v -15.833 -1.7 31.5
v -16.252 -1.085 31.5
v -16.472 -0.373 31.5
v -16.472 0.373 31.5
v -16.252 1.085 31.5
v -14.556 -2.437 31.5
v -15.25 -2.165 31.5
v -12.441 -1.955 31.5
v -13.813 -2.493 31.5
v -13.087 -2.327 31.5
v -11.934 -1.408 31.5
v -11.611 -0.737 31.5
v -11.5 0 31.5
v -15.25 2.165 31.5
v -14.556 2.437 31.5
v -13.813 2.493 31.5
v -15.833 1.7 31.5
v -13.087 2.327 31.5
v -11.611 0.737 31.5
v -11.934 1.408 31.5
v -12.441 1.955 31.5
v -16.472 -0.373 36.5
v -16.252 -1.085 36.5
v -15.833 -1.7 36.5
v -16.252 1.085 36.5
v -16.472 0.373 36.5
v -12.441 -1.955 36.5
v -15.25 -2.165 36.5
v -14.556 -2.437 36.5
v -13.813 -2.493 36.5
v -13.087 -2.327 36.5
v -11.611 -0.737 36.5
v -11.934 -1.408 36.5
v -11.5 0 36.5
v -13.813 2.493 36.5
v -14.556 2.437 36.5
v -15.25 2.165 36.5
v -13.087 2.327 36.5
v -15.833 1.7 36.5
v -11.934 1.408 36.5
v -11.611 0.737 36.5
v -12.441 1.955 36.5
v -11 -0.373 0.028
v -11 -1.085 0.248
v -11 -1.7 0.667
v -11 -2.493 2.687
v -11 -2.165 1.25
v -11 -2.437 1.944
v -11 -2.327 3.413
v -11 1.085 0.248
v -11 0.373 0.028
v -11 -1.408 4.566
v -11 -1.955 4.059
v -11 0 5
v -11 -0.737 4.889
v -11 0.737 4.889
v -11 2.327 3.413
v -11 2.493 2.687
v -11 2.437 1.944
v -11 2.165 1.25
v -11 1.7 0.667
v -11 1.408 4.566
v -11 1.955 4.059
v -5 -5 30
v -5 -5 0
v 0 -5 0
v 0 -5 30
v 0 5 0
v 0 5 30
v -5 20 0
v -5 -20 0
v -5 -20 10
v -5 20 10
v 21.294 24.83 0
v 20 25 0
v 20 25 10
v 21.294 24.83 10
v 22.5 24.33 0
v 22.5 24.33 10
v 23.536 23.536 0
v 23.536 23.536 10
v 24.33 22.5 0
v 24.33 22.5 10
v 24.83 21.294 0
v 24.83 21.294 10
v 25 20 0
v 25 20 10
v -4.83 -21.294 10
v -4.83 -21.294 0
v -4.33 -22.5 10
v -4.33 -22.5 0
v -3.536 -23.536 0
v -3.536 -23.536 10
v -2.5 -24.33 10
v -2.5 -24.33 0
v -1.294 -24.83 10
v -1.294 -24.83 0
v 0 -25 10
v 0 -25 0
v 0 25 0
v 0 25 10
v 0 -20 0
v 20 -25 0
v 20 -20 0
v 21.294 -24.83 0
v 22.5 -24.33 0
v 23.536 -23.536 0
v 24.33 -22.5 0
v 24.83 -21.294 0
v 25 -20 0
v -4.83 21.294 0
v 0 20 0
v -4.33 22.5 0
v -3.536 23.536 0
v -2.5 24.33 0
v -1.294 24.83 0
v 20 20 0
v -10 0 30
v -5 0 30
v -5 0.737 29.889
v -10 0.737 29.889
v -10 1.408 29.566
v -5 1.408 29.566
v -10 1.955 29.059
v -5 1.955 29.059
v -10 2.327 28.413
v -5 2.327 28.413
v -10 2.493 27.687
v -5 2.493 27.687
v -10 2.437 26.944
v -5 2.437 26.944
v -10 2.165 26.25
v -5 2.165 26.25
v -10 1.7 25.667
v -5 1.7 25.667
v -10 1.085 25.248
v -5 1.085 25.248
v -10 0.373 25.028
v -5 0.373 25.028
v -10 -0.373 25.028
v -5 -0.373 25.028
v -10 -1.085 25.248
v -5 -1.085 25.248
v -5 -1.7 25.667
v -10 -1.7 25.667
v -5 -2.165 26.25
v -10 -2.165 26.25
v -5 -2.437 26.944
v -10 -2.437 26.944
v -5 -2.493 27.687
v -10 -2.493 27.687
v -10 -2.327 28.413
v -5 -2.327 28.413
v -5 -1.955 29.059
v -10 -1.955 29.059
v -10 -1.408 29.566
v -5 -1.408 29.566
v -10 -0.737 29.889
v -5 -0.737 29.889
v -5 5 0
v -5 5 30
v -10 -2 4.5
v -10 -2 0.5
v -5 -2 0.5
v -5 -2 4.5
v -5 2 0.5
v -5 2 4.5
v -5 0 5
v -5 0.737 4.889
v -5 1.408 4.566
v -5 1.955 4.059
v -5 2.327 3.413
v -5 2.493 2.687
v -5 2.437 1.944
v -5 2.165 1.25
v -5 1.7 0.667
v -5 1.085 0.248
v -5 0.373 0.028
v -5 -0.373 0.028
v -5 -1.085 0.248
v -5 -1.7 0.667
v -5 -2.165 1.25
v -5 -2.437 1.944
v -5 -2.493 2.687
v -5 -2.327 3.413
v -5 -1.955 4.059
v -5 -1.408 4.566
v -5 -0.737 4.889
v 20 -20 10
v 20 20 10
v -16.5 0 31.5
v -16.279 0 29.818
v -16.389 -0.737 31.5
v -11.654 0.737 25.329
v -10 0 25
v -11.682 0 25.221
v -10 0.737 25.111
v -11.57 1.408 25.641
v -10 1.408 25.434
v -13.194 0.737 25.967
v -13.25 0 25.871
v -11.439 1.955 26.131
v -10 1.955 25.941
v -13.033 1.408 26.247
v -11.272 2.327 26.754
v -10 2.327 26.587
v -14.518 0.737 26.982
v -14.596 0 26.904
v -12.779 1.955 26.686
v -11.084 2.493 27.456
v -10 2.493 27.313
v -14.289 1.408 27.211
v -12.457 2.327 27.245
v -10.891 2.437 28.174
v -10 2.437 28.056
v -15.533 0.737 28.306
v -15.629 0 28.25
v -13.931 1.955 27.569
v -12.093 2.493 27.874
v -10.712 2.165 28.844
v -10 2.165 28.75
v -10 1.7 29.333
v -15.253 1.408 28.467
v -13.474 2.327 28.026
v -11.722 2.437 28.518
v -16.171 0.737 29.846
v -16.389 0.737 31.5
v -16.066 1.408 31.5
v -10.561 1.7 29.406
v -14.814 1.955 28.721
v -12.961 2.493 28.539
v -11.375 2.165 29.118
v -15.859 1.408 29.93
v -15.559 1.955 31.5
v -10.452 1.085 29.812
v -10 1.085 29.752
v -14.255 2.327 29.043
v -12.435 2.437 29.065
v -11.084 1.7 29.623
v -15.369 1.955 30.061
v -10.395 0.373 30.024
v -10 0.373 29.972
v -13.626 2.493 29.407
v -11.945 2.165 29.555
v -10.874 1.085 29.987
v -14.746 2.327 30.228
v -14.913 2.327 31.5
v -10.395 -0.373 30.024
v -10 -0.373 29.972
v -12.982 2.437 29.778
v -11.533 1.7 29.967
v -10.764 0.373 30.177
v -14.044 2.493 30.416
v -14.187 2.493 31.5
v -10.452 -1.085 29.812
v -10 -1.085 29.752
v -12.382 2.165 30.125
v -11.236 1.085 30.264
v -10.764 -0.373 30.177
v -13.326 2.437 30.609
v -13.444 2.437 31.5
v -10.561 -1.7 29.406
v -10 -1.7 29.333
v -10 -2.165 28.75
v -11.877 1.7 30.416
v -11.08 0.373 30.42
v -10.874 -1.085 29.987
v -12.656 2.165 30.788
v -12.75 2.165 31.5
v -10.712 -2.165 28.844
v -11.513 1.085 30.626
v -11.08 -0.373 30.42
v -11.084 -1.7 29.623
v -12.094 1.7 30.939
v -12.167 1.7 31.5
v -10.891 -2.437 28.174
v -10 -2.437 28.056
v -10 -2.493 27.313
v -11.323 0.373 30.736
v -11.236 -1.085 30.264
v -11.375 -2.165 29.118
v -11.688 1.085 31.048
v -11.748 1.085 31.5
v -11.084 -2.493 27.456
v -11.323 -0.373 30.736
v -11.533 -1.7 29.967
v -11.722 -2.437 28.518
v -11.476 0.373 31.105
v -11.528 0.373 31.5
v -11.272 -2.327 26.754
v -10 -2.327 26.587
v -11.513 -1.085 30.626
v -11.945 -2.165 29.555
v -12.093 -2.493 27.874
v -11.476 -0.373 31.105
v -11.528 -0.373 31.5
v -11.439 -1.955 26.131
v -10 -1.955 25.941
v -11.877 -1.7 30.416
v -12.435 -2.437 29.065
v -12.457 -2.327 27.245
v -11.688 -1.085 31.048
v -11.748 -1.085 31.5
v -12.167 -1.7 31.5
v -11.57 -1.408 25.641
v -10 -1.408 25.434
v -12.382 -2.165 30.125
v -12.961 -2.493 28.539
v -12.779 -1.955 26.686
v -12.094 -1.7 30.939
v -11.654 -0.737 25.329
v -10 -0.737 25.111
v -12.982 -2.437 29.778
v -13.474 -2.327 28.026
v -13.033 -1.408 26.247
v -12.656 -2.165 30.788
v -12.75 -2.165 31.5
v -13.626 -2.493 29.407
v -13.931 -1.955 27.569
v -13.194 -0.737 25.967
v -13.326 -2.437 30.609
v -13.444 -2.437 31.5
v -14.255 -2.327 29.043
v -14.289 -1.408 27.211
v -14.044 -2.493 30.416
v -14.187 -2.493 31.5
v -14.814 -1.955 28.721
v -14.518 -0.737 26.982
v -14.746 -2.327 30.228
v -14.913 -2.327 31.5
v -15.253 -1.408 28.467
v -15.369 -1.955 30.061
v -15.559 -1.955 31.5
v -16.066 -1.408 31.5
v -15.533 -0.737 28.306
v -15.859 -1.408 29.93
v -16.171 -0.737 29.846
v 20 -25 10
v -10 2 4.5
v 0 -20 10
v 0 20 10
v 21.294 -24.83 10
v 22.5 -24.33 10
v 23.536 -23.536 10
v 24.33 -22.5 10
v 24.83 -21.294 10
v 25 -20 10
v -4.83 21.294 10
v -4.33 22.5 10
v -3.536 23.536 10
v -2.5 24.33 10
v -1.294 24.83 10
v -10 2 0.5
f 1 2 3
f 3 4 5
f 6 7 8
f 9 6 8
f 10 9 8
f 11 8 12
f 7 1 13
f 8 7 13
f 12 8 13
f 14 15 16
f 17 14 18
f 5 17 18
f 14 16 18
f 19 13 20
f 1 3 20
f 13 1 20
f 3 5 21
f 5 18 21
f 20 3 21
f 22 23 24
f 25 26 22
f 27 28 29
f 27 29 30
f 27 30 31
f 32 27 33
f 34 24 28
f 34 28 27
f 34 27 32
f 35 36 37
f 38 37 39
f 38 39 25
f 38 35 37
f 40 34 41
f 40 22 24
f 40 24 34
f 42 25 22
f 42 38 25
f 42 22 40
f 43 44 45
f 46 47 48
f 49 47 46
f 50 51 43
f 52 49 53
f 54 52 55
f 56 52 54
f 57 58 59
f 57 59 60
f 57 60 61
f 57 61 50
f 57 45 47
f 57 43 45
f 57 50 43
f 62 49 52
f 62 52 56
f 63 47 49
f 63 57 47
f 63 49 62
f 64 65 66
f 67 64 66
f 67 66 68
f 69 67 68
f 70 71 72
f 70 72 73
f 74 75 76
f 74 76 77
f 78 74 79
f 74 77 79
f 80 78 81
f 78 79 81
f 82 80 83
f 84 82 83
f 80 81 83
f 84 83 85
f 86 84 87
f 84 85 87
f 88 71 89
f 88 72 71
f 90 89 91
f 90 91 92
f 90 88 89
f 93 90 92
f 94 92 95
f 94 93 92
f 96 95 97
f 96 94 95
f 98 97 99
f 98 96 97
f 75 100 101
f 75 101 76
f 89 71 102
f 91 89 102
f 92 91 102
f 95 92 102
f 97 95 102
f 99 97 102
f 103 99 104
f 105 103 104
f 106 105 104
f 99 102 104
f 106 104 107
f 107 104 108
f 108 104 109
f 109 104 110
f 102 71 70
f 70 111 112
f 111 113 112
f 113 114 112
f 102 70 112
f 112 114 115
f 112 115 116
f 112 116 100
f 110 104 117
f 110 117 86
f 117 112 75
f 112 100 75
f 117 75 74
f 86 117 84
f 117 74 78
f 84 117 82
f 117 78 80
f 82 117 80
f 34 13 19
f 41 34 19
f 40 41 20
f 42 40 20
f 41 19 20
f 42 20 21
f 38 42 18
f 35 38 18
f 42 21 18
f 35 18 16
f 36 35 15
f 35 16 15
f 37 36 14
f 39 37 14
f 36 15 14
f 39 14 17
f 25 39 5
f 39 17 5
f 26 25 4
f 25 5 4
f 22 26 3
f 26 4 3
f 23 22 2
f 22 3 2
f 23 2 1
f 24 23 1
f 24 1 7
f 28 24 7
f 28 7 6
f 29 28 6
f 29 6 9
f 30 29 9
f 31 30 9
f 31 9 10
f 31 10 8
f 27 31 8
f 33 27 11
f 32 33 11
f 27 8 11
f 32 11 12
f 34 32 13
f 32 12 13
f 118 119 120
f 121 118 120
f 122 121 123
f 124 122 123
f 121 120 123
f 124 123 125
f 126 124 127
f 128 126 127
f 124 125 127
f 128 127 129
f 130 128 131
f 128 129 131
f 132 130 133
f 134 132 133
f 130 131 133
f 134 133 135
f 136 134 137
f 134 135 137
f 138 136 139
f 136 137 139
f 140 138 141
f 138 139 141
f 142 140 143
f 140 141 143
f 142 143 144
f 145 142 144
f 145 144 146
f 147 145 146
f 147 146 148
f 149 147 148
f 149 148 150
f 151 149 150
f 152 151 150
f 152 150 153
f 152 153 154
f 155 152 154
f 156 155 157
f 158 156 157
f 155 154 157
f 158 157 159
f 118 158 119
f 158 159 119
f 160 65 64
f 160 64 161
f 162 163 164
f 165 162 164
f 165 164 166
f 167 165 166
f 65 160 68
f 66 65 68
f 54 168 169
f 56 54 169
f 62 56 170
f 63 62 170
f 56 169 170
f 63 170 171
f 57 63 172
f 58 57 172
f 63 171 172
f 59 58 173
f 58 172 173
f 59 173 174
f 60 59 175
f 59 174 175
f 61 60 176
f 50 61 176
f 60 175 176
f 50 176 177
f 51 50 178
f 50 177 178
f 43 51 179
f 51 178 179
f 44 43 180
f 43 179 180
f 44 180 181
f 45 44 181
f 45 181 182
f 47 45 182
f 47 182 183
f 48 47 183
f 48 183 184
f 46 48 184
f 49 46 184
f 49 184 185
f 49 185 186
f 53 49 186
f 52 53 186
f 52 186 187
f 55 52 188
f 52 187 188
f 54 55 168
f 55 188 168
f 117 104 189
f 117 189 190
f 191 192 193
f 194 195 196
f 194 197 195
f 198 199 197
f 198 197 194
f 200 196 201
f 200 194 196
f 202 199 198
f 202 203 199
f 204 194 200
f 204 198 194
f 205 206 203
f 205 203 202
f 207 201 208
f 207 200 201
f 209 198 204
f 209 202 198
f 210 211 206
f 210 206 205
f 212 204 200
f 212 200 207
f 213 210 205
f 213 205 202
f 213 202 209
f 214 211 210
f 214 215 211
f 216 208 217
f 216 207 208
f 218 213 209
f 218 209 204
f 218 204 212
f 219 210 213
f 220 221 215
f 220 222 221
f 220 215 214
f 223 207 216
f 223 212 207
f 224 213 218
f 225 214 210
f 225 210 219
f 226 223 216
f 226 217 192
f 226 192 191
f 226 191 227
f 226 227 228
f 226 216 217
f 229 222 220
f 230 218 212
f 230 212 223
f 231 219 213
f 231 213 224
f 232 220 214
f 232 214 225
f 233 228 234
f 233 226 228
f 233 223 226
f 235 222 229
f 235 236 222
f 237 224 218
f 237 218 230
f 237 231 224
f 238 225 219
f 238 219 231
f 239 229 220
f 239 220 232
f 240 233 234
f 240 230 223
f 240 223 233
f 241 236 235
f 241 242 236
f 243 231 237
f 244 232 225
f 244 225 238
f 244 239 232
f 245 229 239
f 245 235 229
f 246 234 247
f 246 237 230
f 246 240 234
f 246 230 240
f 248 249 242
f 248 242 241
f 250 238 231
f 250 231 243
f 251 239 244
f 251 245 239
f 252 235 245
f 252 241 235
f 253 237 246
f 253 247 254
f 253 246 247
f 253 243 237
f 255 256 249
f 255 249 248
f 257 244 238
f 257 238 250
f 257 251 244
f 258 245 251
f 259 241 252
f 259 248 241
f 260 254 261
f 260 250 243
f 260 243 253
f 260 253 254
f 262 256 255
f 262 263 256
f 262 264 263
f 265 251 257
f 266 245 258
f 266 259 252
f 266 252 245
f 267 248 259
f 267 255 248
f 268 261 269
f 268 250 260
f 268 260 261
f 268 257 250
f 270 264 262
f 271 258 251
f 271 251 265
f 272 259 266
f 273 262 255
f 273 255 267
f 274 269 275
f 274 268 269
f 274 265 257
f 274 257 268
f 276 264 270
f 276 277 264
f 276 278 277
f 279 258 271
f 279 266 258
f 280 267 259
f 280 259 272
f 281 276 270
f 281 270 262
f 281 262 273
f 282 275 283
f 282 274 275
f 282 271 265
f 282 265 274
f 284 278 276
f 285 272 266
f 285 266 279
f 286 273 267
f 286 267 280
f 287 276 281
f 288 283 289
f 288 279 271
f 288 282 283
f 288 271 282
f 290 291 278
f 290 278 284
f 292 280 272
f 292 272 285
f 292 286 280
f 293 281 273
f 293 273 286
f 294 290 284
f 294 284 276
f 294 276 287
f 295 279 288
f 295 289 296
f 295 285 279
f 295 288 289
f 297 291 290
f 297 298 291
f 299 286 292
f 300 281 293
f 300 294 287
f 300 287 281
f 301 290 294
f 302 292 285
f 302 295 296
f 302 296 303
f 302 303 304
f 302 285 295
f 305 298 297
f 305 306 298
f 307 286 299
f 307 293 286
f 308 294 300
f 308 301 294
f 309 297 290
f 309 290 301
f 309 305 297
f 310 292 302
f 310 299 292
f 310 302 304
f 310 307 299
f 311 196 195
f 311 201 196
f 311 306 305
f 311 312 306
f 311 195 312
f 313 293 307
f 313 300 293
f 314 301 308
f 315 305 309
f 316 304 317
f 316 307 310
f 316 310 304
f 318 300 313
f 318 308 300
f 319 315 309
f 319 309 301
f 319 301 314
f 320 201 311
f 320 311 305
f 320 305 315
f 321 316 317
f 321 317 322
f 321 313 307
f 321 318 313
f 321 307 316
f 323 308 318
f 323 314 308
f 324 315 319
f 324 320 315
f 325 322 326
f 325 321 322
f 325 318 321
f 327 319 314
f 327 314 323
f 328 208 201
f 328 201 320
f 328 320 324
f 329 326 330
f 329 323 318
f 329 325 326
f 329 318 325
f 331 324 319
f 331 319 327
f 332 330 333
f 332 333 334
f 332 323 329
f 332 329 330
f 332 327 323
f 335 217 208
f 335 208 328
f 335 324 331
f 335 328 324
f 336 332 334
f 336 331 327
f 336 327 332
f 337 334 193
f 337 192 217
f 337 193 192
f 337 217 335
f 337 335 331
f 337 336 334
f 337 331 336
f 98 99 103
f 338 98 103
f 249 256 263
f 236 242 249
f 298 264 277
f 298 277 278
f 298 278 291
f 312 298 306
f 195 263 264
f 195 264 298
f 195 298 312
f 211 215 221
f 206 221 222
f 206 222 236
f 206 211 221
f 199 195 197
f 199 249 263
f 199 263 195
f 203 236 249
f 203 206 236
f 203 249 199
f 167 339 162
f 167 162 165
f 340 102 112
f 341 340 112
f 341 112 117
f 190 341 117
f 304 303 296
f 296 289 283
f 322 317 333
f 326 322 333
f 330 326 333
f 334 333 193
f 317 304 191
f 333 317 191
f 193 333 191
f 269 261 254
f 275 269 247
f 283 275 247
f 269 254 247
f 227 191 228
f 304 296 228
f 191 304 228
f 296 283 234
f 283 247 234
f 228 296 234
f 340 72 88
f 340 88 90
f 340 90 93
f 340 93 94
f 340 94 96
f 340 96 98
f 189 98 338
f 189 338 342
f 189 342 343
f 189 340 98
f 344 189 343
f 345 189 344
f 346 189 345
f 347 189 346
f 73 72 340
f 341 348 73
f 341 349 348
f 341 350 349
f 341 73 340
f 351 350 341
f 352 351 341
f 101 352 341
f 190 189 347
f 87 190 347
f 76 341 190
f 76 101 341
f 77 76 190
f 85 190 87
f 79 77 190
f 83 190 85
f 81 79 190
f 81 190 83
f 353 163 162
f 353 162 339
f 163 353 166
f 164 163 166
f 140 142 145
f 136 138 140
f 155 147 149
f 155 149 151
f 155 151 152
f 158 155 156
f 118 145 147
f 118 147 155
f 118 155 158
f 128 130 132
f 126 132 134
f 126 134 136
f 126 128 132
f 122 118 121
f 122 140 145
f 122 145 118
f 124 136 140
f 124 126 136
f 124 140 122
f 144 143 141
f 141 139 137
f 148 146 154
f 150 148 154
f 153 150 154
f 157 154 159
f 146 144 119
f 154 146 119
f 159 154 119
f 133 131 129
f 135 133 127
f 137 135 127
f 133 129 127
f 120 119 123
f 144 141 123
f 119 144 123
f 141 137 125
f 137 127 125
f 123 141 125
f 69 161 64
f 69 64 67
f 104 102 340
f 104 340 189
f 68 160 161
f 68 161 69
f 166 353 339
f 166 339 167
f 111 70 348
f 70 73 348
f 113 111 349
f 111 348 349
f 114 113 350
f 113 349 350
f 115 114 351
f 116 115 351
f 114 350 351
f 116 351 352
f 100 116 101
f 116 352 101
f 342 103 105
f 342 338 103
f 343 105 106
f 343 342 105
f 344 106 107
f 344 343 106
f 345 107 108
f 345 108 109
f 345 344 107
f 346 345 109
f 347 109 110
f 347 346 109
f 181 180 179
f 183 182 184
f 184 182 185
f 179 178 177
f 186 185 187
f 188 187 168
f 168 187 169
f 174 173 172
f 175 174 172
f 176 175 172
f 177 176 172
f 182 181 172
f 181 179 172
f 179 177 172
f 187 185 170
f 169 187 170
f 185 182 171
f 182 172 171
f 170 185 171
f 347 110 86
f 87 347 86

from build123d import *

# Parameters (mm, degrees)
CYLINDER002_R           = 2.5
CYLINDER002_DEPTH       = 6
CYLINDER002_PITCH_ANGLE = -90
BOX001_W                = 5
BOX001_H                = 10
BOX001_DEPTH            = 30
CYLINDER003_R           = 2.5
CYLINDER003_DEPTH       = 5
CYLINDER003_PITCH_ANGLE = -90
TORUS_R                 = 2.5
TORUS_ANGLE             = 90
CYLINDER004_R           = 2.5
CYLINDER004_DEPTH       = 5
BOX002_W                = 5
BOX002_H                = 4
BOX002_DEPTH            = 4
BOX003_W                = 20
BOX003_H                = 40
BOX003_DEPTH            = 10
BOX_W                   = 30
BOX_H                   = 50
BOX_DEPTH               = 10
FILLET_R                = 5


with BuildPart() as cylinder002:
    # Cylinder002 → Cylinder002 (new body)
    with BuildSketch(Plane.XY):
        Circle(CYLINDER002_R)
    extrude(amount=CYLINDER002_DEPTH)


with BuildPart() as cylinder002_1:
    # Cylinder002 pitch: moved
    add(cylinder002.part.rotate(Axis((0, 0, 0), (0, 1, 0)), CYLINDER002_PITCH_ANGLE))


with BuildPart() as cylinder002_2:
    # Cylinder002 placement: moved
    add(cylinder002_1.part.moved(Location((-5, 0, 2.5))))


with BuildPart() as cube001:
    # Box001 → Box001 (new body)
    with BuildSketch(Plane(origin=(-5, -5, 0), x_dir=(1, 0, 0), z_dir=(0, 0, 1))):
        with Locations((2.5, 5)):
            Rectangle(BOX001_W, BOX001_H)
    extrude(amount=BOX001_DEPTH)


with BuildPart() as cylinder003:
    # Cylinder003 → Cylinder003 (new body)
    with BuildSketch(Plane.XY):
        Circle(CYLINDER003_R)
    extrude(amount=CYLINDER003_DEPTH)


with BuildPart() as cylinder003_1:
    # Cylinder003 pitch: moved
    add(cylinder003.part.rotate(Axis((0, 0, 0), (0, 1, 0)), CYLINDER003_PITCH_ANGLE))


with BuildPart() as cylinder003_2:
    # Cylinder003 placement: moved
    add(cylinder003_1.part.moved(Location((-5, 0, 27.5))))


with BuildPart() as torus:
    # Torus → Torus (revolve)
    with BuildSketch(Plane(origin=(-10, 0, 31.5), x_dir=(0, 0, -1), z_dir=(1, 0, 0))):
        with Locations((4, 0)):
            Circle(TORUS_R)
    revolve(axis=Axis((-10, 0, 31.5), (0, 1, 0)), revolution_arc=TORUS_ANGLE)


with BuildPart() as cylinder004:
    # Cylinder004 → Cylinder004 (new body)
    with BuildSketch(Plane(origin=(-14, 0, 31.5), x_dir=(1, 0, 0), z_dir=(0, 0, 1))):
        Circle(CYLINDER004_R)
    extrude(amount=CYLINDER004_DEPTH)


with BuildPart() as cube002:
    # Box002 → Box002 (new body)
    with BuildSketch(Plane(origin=(-10, -2, 0.5), x_dir=(1, 0, 0), z_dir=(0, 0, 1))):
        with Locations((2.5, 2)):
            Rectangle(BOX002_W, BOX002_H)
    extrude(amount=BOX002_DEPTH)


with BuildPart() as cube003:
    # Box003 → Box003 (new body)
    with BuildSketch(Plane(origin=(0, -20, 0), x_dir=(1, 0, 0), z_dir=(0, 0, 1))):
        with Locations((10, 20)):
            Rectangle(BOX003_W, BOX003_H)
    extrude(amount=BOX003_DEPTH)


with BuildPart() as fillet_body:
    # Box → Box (new body)
    with BuildSketch(Plane(origin=(-5, -25, 0), x_dir=(1, 0, 0), z_dir=(0, 0, 1))):
        with Locations((15, 25)):
            Rectangle(BOX_W, BOX_H)
    extrude(amount=BOX_DEPTH)

    # Cut: cut Cube003
    add(cube003.part, mode=Mode.SUBTRACT)

    # Fillet
    fillet_edges = [fillet_body.edges().sort_by_distance(p)[0] for p in [
        (-5, -25, 5),
        (-5, 25, 5),
        (25, -25, 5),
        (25, 25, 5),
    ]]
    fillet(fillet_edges, radius=FILLET_R)


solid = Compound([cylinder002_2.part, cube001.part, cylinder003_2.part, torus.part, cylinder004.part, cube002.part, fillet_body.part])
